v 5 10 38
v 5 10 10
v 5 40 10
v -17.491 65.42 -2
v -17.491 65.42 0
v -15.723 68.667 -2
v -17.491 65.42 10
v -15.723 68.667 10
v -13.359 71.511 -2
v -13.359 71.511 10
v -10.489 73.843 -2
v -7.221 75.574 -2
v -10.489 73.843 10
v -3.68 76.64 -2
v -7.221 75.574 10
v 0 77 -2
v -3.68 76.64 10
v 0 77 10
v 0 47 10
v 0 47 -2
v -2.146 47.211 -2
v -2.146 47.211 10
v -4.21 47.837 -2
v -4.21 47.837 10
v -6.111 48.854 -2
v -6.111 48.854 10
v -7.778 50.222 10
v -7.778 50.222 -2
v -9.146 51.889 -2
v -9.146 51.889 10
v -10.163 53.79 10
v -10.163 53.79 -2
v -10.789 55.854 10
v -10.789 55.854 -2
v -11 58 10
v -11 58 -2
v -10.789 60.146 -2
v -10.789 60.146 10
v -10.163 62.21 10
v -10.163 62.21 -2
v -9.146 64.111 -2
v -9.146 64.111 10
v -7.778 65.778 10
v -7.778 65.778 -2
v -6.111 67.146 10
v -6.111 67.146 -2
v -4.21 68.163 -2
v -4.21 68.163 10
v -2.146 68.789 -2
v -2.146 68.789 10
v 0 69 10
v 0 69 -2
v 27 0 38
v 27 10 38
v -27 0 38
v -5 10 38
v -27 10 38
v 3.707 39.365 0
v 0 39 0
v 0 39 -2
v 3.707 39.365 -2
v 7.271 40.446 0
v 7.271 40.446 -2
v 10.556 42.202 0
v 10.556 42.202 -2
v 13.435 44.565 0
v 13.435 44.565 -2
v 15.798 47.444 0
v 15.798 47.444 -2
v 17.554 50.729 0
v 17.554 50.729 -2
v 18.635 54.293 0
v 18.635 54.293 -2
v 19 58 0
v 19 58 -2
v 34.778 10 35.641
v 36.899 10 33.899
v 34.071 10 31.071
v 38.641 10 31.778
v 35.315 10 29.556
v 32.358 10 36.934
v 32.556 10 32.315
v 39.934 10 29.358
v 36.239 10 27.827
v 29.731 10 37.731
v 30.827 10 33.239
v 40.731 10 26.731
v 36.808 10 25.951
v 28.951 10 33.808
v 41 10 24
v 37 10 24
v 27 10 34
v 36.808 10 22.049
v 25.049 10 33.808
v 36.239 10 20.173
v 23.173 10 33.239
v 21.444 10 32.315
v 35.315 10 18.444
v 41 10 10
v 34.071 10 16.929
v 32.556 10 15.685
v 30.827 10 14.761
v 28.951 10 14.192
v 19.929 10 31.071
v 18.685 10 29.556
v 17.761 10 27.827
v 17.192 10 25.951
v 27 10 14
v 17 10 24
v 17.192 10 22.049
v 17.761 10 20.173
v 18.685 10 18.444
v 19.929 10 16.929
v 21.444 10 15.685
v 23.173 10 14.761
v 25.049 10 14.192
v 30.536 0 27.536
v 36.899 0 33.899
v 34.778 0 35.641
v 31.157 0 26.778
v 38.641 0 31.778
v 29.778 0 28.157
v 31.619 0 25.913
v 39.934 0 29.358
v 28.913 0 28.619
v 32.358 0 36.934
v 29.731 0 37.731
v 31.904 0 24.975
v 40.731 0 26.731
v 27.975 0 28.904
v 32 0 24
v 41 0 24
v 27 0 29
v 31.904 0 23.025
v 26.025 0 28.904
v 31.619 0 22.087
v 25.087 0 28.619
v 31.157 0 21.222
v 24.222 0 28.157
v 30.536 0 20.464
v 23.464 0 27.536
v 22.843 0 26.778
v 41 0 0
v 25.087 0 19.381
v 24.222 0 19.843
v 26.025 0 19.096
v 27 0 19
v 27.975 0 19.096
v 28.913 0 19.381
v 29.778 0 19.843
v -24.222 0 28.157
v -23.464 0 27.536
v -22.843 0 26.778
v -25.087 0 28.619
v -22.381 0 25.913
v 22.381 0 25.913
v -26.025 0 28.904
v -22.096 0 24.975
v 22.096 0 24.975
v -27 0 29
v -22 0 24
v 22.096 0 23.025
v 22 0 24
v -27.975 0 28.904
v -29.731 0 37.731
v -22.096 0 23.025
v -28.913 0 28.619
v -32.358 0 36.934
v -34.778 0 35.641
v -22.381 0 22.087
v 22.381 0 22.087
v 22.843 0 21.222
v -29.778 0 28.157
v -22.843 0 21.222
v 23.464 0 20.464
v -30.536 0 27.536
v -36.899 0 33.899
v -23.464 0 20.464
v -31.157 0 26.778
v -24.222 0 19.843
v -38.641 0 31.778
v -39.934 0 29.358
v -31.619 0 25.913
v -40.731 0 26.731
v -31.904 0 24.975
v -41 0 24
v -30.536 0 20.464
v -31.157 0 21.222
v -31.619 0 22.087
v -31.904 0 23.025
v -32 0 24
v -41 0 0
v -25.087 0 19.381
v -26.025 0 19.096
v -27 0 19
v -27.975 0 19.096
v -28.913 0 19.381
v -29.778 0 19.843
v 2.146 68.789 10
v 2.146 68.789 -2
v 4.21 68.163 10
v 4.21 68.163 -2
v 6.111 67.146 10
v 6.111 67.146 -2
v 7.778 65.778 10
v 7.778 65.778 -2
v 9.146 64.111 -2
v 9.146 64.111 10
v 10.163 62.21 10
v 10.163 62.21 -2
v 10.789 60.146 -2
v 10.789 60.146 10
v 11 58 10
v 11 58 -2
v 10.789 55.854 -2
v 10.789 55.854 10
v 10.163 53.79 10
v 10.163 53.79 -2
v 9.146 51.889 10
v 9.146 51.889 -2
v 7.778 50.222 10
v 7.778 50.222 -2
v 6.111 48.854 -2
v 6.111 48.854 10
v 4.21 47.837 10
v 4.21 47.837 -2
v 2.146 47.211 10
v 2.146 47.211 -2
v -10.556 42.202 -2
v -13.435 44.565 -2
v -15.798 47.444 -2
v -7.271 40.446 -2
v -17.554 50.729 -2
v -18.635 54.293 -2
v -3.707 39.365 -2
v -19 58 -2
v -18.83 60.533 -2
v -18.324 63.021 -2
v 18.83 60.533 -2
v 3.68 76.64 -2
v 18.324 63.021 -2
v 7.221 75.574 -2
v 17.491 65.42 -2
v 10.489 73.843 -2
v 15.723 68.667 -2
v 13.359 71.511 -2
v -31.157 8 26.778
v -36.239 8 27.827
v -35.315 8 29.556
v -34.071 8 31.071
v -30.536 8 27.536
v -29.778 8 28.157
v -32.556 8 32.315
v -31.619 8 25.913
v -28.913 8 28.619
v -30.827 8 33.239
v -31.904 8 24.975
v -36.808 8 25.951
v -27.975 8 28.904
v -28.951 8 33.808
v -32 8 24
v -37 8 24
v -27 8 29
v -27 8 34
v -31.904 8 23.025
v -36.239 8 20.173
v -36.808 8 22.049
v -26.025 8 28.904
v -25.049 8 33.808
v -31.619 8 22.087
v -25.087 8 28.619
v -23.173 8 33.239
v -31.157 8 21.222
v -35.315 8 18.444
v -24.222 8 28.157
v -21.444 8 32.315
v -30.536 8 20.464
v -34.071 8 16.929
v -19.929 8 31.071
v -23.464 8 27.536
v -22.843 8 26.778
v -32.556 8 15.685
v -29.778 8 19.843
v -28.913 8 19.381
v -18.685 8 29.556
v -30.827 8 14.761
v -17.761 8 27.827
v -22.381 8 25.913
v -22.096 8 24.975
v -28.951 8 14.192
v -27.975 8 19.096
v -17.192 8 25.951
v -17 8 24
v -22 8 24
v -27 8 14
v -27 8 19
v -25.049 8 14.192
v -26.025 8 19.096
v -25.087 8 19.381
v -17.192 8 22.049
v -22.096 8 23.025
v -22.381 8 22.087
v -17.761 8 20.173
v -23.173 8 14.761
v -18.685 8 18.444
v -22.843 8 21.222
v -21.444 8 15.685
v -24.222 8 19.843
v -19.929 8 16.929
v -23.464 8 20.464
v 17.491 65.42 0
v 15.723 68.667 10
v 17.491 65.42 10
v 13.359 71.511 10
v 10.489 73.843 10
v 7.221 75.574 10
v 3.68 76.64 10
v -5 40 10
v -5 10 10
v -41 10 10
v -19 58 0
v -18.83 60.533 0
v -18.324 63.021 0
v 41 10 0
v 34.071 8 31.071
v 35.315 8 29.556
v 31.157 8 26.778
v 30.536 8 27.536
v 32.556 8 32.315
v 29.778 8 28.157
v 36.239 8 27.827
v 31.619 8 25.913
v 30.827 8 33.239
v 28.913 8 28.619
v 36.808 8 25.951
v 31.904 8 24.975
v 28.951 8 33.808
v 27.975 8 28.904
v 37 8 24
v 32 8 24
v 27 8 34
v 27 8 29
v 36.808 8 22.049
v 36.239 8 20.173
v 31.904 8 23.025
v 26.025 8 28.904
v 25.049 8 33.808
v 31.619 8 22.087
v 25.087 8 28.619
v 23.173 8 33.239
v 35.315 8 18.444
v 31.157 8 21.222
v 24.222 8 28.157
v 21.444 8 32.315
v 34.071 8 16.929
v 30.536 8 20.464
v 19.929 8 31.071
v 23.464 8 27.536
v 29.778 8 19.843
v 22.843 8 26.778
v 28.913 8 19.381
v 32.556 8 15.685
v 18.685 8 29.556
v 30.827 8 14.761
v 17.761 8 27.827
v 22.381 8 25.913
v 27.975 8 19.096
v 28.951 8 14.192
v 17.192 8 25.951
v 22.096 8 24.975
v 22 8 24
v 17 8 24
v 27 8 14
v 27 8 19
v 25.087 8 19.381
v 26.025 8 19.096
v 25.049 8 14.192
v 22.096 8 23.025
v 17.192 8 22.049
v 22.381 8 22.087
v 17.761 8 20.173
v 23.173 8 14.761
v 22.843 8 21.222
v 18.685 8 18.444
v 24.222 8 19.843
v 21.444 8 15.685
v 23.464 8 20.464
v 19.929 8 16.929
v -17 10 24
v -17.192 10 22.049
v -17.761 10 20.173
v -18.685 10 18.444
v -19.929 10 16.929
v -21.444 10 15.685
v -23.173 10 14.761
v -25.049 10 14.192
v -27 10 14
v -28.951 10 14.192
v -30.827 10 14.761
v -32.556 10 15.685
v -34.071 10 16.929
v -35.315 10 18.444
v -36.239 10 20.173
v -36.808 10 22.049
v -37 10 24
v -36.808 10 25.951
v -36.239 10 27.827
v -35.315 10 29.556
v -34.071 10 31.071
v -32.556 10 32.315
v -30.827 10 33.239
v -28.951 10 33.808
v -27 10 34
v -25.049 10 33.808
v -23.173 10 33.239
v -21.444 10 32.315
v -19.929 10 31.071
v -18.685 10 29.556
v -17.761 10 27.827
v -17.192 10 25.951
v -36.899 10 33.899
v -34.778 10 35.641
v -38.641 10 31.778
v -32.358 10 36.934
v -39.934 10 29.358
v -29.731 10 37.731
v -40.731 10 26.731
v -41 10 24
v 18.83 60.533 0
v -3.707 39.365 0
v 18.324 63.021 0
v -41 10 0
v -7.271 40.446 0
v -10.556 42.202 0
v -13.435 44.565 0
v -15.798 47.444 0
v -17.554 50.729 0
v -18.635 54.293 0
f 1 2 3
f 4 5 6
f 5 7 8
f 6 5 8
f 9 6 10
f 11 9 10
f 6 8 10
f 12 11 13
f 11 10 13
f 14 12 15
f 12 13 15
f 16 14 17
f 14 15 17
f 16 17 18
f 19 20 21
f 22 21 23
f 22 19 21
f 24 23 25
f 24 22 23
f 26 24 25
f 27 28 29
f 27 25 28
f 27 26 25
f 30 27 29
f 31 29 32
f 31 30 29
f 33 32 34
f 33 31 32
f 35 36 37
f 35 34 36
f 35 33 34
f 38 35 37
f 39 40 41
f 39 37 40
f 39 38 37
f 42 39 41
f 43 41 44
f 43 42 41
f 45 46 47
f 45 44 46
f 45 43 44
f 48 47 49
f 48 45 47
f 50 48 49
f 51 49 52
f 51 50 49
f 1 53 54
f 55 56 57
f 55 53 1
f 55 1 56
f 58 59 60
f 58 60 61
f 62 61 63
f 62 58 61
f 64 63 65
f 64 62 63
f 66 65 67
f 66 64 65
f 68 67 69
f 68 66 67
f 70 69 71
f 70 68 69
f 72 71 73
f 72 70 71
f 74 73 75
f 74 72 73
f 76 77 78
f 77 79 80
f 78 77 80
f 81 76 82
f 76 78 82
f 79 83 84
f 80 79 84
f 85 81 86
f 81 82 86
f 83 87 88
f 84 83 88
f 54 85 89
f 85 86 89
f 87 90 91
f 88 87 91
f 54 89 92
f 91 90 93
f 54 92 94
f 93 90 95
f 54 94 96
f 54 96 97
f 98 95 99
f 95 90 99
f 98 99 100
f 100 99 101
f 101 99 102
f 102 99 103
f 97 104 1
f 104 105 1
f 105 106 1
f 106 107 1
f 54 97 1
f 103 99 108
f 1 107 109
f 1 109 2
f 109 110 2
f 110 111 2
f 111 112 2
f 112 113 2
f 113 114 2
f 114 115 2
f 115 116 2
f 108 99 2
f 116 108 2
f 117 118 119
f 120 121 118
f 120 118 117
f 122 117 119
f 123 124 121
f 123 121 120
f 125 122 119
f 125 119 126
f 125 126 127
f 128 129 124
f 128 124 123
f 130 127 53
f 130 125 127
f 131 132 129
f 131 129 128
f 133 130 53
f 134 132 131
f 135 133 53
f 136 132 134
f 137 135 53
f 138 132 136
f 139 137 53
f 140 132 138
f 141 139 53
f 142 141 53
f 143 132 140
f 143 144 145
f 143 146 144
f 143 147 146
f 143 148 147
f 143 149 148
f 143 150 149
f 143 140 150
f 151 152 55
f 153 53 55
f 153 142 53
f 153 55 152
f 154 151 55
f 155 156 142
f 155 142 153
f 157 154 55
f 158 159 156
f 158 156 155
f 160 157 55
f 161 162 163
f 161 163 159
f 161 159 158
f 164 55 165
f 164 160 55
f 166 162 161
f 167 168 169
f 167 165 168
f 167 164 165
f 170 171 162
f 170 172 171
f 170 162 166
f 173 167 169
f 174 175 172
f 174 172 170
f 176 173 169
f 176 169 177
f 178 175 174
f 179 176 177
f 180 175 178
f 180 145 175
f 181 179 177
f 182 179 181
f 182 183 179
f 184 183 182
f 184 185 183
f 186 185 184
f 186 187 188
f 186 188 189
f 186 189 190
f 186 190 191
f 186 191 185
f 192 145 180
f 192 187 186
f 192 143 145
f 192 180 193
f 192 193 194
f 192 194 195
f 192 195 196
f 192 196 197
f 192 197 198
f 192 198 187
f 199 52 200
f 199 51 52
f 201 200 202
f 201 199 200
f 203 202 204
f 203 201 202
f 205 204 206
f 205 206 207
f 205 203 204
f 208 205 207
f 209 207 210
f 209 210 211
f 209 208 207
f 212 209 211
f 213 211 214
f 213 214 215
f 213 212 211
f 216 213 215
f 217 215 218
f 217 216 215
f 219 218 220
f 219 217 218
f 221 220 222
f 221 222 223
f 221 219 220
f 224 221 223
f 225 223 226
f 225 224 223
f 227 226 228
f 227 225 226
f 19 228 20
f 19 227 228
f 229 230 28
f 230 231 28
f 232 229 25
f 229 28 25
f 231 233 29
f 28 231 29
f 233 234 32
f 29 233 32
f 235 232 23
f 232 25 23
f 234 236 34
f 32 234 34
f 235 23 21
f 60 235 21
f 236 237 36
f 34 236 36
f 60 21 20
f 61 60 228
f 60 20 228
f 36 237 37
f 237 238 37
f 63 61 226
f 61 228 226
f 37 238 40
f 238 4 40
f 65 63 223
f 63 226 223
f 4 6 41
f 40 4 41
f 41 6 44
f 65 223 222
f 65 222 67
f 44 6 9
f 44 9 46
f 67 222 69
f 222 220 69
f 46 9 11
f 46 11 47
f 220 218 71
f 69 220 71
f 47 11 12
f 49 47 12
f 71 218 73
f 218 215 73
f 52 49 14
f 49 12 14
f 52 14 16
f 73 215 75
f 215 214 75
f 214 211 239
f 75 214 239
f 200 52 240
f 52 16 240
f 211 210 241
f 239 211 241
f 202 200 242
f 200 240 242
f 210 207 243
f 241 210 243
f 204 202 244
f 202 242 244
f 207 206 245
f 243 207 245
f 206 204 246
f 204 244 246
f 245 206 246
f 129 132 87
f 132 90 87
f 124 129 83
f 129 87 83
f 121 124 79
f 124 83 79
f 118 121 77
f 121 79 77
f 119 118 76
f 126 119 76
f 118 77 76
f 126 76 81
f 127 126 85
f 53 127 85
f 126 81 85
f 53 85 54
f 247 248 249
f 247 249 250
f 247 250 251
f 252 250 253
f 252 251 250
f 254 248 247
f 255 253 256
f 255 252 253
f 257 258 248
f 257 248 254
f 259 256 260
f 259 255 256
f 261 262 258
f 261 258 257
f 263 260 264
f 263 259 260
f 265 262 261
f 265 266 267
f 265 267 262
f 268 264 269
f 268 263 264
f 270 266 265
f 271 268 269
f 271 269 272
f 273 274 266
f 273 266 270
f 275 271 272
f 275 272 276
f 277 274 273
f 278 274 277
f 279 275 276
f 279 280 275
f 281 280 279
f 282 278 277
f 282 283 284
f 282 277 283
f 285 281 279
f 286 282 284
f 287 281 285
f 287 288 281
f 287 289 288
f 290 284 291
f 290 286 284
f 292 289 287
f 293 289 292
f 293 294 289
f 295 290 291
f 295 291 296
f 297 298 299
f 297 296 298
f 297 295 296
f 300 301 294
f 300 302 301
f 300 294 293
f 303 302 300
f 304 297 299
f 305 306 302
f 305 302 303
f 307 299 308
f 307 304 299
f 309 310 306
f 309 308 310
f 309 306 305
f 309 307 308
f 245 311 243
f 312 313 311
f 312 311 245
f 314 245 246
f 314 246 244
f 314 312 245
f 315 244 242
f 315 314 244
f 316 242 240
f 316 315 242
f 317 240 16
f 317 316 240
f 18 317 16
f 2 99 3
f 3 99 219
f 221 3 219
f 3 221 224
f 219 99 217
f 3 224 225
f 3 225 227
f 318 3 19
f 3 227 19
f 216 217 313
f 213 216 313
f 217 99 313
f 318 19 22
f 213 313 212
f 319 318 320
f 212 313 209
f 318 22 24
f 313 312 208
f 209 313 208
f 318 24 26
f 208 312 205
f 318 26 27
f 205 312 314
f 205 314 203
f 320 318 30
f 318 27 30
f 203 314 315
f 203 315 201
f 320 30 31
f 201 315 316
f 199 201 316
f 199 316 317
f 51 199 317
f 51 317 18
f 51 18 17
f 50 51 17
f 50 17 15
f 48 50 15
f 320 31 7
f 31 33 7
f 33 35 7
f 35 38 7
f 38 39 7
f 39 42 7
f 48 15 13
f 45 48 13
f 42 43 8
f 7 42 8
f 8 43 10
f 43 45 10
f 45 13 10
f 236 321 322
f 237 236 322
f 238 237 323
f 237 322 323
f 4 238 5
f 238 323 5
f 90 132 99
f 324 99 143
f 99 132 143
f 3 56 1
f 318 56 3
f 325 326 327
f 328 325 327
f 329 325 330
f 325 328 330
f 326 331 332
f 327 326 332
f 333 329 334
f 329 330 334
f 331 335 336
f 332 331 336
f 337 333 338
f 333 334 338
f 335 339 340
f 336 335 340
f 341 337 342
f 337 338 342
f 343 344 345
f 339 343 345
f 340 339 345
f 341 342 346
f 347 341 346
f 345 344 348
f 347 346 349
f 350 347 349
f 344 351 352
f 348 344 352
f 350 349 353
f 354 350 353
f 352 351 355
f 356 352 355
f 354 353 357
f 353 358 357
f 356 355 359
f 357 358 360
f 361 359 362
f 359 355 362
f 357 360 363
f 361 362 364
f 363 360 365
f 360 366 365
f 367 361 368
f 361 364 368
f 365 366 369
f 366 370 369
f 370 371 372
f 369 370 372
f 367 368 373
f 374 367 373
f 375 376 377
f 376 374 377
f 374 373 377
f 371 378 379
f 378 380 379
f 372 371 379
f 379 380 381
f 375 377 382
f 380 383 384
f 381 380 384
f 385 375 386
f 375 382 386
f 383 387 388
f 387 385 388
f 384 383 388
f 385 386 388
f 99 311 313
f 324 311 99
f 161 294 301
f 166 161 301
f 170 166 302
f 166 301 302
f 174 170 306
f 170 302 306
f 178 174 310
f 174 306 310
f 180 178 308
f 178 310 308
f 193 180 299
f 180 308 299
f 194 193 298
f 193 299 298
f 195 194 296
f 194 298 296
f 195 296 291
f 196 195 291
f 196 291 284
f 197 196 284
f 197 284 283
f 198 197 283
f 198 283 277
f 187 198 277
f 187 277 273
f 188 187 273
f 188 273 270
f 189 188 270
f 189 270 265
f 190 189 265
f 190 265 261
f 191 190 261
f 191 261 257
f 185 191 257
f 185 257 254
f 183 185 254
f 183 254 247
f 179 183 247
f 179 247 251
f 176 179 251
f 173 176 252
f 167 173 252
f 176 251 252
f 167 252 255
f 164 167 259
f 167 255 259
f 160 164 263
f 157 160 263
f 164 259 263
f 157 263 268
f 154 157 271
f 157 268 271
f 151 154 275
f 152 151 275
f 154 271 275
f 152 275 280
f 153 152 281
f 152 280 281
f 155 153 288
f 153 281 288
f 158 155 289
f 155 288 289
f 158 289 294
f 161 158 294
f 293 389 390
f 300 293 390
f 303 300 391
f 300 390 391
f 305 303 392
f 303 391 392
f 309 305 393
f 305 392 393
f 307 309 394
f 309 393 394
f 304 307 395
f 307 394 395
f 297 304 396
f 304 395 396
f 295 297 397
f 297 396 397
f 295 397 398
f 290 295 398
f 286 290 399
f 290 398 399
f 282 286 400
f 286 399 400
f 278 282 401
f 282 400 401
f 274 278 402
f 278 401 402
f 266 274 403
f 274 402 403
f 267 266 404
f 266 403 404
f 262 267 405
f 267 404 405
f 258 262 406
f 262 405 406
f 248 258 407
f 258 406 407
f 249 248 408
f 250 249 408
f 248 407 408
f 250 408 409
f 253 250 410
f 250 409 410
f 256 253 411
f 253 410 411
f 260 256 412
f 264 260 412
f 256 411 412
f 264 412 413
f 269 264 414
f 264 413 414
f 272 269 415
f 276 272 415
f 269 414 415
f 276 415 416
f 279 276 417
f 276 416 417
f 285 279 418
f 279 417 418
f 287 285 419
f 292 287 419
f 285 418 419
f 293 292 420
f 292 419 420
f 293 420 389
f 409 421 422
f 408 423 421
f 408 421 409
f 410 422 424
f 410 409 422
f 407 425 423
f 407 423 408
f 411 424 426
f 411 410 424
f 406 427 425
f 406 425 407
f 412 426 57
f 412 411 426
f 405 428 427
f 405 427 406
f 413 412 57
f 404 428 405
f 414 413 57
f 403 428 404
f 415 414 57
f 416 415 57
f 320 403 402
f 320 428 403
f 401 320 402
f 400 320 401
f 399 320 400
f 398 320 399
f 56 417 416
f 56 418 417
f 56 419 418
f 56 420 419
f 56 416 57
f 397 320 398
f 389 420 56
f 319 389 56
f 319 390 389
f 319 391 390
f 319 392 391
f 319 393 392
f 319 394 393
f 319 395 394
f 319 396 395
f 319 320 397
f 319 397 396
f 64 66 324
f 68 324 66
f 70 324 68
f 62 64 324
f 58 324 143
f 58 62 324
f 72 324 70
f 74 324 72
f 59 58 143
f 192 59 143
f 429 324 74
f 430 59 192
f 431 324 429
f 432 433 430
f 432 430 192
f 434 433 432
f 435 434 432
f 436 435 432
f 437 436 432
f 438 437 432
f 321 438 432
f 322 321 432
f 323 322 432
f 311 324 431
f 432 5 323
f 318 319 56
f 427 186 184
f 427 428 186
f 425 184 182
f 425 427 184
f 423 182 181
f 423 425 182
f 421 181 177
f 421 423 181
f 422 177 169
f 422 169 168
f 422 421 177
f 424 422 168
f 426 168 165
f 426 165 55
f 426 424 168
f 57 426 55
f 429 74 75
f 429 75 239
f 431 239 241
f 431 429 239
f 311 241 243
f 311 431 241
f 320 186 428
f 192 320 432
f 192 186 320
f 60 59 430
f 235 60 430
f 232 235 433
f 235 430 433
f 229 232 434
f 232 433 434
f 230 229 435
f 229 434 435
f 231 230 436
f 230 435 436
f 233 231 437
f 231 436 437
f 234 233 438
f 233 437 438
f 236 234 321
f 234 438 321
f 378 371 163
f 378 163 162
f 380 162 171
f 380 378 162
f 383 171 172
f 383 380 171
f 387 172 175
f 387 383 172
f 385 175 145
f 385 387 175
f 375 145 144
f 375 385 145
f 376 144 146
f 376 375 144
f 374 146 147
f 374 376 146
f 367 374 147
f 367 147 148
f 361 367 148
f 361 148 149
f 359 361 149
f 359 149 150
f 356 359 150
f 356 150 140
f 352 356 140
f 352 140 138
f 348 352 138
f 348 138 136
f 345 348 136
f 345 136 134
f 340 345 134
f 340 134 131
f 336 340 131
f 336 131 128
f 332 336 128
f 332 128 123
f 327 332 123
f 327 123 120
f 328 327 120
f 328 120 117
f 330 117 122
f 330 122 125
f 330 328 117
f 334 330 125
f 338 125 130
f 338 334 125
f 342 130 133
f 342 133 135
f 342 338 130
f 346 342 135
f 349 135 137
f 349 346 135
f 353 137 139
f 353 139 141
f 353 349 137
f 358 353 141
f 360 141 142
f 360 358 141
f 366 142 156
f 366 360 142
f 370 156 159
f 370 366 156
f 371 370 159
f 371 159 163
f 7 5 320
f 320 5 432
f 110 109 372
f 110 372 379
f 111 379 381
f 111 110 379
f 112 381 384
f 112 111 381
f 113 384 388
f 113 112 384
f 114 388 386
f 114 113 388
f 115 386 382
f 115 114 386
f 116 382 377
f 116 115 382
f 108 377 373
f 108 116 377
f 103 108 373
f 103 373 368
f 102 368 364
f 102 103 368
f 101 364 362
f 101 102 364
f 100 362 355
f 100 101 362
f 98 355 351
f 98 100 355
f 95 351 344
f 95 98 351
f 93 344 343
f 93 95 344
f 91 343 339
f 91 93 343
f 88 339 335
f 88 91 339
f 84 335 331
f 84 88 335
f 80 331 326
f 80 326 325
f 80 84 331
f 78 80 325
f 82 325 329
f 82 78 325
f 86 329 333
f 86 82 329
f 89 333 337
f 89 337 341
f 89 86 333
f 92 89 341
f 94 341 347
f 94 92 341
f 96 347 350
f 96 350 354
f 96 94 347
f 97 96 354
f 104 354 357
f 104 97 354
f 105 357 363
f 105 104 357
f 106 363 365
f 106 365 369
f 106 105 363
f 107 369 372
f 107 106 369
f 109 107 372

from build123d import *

# Parameters (mm, degrees)
SKETCH1_W           = 41
SKETCH1_H           = 38
BOSS_EXTRUDE1_DEPTH = 10
SKETCH2_R           = 10
SKETCH2_R_2         = 5
CUT_EXTRUDE1_DEPTH  = 2
CUT_EXTRUDE2_REACH  = 58.789
SKETCH2_2_R         = 5
FILLET1_R           = 14
BOSS_EXTRUDE2_DEPTH = 10
BOSS_EXTRUDE3_START = 2
BOSS_EXTRUDE3_DEPTH = 2
BOSS_EXTRUDE4_DEPTH = 5


with BuildPart() as part:
    # Sketch1 → Boss-Extrude1 (new body)
    with BuildSketch(Plane(origin=(0, 0, 0), x_dir=(1, 0, 0), z_dir=(0, 1, 0))):
        with Locations((-20.5, -19)):
            Rectangle(SKETCH1_W, SKETCH1_H)
    extrude(amount=BOSS_EXTRUDE1_DEPTH)

    # Sketch2 → Cut-Extrude1 (cut)
    with BuildSketch(Plane(origin=(0, 10, 0), x_dir=(1, 0, 0), z_dir=(0, 1, 0))):
        with Locations((-27, -24)):
            Circle(SKETCH2_R)
        with Locations((-27, -24)):
            Circle(SKETCH2_R_2, mode=Mode.SUBTRACT)
    extrude(amount=-CUT_EXTRUDE1_DEPTH, mode=Mode.SUBTRACT)

    # Sketch2<2> → Cut-Extrude2 (cut, up to next)
    with BuildSketch(Plane(origin=(0, 10, 0), x_dir=(1, 0, 0), z_dir=(0, 1, 0)), mode=Mode.PRIVATE) as cut_extrude2_sk1:
        with Locations((-27, -24)):
            Circle(SKETCH2_2_R)
    cut_extrude2_tool1 = extrude(cut_extrude2_sk1.sketch, amount=-CUT_EXTRUDE2_REACH, mode=Mode.PRIVATE) & part.part
    add(cut_extrude2_tool1.solids().sort_by_distance((-27, 10, 24))[0], mode=Mode.SUBTRACT)

    # Fillet1
    fillet1_edges = [part.edges().sort_by_distance(p)[0] for p in [
        (-41, 5, 38),
    ]]
    fillet(fillet1_edges, radius=FILLET1_R)

    # Sketch4 → Boss-Extrude2 (add)
    with BuildSketch(Plane.XY):
        with BuildLine():
            ThreePointArc((0, 77), (-10.488696893, 73.842576731), (-17.491366878, 65.419709208))
            Line((-17.491366878, 65.419709208), (-41, 10))
            Line((-41, 10), (0, 10))
            Line((0, 10), (0, 47))
            ThreePointArc((0, 47), (-11, 58), (0, 69))
            Line((0, 69), (0, 77))
        make_face()
    extrude(amount=BOSS_EXTRUDE2_DEPTH)

    # Sketch5 → Boss-Extrude3 (add)
    with BuildSketch(Plane(origin=(0, 0, 0), x_dir=(-1, 0, 0), z_dir=(0, 0, -1)).offset(BOSS_EXTRUDE3_START)):
        with BuildLine():
            Line((0, 47), (0, 39))
            ThreePointArc((0, 39), (13.435028843, 44.564971157), (19, 58))
            ThreePointArc((19, 58), (18.619022137, 61.785764739), (17.491366878, 65.419709208))
            ThreePointArc((17.491366878, 65.419709208), (10.488696893, 73.842576731), (0, 77))
            Line((0, 77), (0, 69))
            ThreePointArc((0, 69), (11, 58), (0, 47))
        make_face()
    extrude(amount=-BOSS_EXTRUDE3_DEPTH)

    # Sketch6 → Boss-Extrude4 (add)
    with BuildSketch(Plane(origin=(0, 0, 0), x_dir=(0, 0, -1), z_dir=(1, 0, 0))):
        Polygon((-38, 10), (-10, 40), (-10, 10), align=None)
    extrude(amount=-BOSS_EXTRUDE4_DEPTH)

    # Mirror1: part across plane


with BuildPart() as part_1:
    add(part.part)
    add(part.part.mirror(Plane(origin=(0, 10, 0), x_dir=(0, 0, 1), z_dir=(-1, 0, 0))))


solid = part_1.part
